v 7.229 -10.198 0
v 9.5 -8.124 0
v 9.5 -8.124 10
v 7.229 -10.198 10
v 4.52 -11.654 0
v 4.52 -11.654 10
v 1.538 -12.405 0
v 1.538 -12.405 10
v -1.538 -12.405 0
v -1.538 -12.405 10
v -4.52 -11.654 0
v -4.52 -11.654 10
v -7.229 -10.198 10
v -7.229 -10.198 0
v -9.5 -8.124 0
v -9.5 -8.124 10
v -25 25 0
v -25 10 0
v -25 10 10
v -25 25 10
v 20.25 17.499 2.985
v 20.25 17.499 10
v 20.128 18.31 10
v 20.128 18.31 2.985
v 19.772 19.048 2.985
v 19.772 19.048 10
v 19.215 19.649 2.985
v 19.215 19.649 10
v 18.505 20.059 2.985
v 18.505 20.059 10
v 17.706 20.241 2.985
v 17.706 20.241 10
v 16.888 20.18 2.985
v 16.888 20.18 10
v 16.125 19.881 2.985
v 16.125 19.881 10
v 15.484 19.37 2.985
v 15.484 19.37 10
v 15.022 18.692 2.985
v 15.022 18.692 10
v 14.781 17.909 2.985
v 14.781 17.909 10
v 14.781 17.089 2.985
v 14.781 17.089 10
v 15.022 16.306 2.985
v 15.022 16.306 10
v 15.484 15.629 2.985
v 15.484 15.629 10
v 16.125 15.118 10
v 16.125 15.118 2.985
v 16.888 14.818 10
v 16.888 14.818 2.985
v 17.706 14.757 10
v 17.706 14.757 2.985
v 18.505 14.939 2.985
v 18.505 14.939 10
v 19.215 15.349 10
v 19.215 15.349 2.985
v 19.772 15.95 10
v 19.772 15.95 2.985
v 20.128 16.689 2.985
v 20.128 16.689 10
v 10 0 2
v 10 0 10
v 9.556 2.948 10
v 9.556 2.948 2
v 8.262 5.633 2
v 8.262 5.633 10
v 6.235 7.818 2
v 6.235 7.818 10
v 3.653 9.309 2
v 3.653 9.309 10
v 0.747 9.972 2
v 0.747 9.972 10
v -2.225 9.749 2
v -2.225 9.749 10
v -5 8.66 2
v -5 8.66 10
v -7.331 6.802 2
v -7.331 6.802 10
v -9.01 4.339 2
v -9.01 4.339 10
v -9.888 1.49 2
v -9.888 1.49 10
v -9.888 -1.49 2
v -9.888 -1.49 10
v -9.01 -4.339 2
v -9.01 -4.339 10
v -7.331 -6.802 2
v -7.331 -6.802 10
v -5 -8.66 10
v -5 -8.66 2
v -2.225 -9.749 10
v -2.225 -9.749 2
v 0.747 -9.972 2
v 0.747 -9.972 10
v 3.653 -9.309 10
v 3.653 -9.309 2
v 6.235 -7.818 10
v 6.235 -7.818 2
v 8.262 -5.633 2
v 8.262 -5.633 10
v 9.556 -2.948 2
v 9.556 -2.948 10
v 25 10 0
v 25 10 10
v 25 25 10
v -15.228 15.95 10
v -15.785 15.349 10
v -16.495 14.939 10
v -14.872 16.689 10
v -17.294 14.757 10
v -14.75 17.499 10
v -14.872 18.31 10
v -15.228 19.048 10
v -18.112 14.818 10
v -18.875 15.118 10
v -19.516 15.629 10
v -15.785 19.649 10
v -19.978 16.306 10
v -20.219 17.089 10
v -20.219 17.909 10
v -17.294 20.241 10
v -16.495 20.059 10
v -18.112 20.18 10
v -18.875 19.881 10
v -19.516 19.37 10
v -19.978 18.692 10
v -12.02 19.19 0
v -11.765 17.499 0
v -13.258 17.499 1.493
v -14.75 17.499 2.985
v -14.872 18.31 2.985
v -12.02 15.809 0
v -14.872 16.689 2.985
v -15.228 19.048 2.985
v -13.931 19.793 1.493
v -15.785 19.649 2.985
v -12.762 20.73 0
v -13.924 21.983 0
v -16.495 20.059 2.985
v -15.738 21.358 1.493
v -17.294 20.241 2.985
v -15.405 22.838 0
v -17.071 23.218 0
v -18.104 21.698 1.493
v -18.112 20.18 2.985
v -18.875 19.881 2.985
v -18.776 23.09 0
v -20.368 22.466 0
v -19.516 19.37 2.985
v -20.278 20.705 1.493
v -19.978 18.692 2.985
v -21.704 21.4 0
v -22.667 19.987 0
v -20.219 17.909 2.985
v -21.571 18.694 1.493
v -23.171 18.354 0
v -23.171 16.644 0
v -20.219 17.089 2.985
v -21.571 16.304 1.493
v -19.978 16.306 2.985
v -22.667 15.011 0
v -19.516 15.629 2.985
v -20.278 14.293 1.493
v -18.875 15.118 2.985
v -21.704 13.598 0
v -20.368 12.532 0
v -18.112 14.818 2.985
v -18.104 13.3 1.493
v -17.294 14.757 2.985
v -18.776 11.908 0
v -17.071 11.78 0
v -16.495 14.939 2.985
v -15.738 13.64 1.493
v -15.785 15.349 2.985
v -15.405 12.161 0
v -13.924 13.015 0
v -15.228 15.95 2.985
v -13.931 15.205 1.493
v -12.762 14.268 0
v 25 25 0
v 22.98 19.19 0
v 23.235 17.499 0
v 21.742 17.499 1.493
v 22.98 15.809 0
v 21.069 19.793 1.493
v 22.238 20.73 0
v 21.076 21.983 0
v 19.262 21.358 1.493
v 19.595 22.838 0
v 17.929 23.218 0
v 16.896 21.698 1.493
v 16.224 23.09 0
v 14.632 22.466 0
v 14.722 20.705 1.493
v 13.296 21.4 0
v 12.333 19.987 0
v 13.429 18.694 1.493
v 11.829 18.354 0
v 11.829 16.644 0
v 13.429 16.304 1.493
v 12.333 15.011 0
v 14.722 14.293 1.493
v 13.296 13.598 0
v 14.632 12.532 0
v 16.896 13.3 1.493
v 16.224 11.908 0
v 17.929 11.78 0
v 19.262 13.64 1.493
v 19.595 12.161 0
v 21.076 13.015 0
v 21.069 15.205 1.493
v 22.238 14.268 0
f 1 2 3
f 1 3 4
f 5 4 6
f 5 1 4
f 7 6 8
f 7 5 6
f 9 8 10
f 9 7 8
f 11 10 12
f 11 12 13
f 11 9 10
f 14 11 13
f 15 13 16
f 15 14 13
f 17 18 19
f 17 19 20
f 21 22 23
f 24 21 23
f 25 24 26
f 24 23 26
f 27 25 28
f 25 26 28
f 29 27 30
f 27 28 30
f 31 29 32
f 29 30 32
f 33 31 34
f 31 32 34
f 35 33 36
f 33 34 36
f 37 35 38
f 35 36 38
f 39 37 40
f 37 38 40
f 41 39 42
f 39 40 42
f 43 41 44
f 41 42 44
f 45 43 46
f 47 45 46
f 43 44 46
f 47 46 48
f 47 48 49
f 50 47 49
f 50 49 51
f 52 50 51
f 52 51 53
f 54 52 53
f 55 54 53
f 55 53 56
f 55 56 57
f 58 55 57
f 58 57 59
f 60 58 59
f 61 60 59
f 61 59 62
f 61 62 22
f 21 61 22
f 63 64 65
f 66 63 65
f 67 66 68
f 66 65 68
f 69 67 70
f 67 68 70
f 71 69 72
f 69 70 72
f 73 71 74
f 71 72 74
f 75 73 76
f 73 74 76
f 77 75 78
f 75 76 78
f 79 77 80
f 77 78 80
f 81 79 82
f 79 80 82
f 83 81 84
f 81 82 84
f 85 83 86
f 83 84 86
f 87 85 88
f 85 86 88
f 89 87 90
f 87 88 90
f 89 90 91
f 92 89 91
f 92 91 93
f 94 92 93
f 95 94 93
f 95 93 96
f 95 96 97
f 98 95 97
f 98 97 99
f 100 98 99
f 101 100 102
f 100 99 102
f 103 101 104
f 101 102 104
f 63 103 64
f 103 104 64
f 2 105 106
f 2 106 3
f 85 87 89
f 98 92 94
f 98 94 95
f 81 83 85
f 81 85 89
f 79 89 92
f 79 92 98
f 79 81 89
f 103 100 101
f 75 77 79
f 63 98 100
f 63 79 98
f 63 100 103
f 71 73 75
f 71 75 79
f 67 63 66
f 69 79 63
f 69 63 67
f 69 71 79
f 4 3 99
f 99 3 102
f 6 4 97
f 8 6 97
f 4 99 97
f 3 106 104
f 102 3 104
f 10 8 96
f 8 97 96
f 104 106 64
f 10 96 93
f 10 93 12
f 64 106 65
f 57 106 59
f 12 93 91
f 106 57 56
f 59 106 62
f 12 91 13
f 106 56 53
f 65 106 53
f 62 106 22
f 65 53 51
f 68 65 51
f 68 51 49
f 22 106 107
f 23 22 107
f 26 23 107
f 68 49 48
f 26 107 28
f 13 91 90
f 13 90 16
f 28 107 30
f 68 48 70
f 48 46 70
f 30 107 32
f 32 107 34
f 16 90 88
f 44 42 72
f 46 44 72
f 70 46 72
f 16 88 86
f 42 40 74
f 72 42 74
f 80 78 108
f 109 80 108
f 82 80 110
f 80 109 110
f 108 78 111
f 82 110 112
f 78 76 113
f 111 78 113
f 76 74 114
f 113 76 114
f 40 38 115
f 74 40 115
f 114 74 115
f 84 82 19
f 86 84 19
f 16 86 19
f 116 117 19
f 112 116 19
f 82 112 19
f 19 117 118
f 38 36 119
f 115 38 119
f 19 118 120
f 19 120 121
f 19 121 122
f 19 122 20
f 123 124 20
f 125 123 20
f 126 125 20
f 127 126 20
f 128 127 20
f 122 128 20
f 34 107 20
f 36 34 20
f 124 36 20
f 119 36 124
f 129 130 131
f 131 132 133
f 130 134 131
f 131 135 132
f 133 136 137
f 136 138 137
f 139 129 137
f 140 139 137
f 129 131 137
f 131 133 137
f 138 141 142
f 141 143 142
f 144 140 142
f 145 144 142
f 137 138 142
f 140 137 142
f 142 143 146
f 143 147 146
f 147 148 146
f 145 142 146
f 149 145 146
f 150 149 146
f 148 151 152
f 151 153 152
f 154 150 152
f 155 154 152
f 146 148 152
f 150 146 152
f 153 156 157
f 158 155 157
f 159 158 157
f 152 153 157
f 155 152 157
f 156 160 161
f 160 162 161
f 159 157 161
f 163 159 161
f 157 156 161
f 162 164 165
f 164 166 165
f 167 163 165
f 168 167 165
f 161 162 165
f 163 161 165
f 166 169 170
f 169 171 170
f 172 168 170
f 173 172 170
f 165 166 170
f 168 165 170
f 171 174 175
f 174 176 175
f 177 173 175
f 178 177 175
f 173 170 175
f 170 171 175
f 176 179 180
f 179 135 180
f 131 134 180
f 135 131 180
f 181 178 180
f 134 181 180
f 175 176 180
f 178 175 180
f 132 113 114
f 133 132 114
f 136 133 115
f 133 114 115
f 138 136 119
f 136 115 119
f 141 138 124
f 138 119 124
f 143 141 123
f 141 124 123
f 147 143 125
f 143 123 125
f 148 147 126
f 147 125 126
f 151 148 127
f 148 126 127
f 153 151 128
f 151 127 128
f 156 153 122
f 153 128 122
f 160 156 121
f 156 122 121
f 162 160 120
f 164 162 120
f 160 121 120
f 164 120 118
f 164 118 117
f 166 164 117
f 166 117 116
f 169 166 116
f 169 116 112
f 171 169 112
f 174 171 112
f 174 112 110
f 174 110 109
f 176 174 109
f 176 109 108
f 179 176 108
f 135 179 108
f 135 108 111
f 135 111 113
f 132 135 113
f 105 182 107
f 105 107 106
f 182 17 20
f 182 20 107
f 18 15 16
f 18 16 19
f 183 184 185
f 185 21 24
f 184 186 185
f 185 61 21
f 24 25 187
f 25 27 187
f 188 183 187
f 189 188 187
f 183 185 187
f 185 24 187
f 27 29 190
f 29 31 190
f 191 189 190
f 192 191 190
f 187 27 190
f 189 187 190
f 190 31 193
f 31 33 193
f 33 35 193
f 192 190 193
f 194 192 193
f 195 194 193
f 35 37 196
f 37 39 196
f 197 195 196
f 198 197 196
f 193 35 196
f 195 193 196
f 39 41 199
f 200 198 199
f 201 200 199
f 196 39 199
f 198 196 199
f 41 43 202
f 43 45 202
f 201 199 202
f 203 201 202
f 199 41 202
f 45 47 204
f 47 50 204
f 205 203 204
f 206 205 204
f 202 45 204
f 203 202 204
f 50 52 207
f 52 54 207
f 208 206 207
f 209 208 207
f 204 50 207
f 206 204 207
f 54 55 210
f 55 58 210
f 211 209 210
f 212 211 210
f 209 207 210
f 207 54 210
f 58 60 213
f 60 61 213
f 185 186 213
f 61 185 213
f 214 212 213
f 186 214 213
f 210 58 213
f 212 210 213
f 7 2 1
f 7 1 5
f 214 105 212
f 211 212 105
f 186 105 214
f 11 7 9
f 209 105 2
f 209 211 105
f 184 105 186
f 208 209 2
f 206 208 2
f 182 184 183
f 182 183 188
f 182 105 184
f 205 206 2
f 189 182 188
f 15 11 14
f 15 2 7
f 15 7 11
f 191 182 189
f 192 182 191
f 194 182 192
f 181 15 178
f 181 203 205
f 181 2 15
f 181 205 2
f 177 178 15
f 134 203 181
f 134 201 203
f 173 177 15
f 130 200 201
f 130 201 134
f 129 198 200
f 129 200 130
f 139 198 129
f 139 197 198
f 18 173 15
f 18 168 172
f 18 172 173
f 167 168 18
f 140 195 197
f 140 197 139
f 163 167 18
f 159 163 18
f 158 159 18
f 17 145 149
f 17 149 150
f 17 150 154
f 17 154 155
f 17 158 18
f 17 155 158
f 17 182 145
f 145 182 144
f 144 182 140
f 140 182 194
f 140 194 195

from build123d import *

# Parameters (mm, degrees)
AUFSATZ_LINEAR_AUSTRAGEN1_DEPTH                      = 10
SKIZZE2_R                                            = 10
SCHNITT_LINEAR_AUSTRAGEN1_DEPTH                      = 8
FORMSENKUNG_F_R_M5_SENKSCHRAUBE_MIT_INNE_D           = 5.5
FORMSENKUNG_F_R_M5_SENKSCHRAUBE_MIT_INNE_DEPTH       = 10
FORMSENKUNG_F_R_M5_SENKSCHRAUBE_MIT_INNE_CSINK_D     = 11.47
FORMSENKUNG_F_R_M5_SENKSCHRAUBE_MIT_INNE_CSINK_ANGLE = 90


with BuildPart() as part:
    # Skizze1 → Aufsatz-Linear austragen1 (new body)
    with BuildSketch(Plane.XY):
        with BuildLine():
            Line((-9.499737937, -8.124344843), (-25, 10))
            Line((-25, 10), (-25, 25))
            Line((-25, 25), (25, 25))
            Line((25, 25), (25, 10))
            Line((25, 10), (9.499737937, -8.124344843))
            ThreePointArc((9.499737937, -8.124344843), (0, -12.5), (-9.499737937, -8.124344843))
        make_face()
    extrude(amount=AUFSATZ_LINEAR_AUSTRAGEN1_DEPTH)

    # Skizze2 → Schnitt-Linear austragen1 (cut)
    with BuildSketch(Plane.XY.offset(10)):
        Circle(SKIZZE2_R)
    extrude(amount=-SCHNITT_LINEAR_AUSTRAGEN1_DEPTH, mode=Mode.SUBTRACT)

    # Formsenkung für M5 Senkschraube mit Innensechskant1
    with Locations(Plane(origin=(0, 0, 0), x_dir=(-1, 0, 0), z_dir=(0, 0, -1))):
        with Locations((-17.5, 17.499100788), (17.5, 17.499100788)):
            CounterSinkHole(FORMSENKUNG_F_R_M5_SENKSCHRAUBE_MIT_INNE_D / 2, FORMSENKUNG_F_R_M5_SENKSCHRAUBE_MIT_INNE_CSINK_D / 2, depth=FORMSENKUNG_F_R_M5_SENKSCHRAUBE_MIT_INNE_DEPTH, counter_sink_angle=FORMSENKUNG_F_R_M5_SENKSCHRAUBE_MIT_INNE_CSINK_ANGLE)


solid = part.part
